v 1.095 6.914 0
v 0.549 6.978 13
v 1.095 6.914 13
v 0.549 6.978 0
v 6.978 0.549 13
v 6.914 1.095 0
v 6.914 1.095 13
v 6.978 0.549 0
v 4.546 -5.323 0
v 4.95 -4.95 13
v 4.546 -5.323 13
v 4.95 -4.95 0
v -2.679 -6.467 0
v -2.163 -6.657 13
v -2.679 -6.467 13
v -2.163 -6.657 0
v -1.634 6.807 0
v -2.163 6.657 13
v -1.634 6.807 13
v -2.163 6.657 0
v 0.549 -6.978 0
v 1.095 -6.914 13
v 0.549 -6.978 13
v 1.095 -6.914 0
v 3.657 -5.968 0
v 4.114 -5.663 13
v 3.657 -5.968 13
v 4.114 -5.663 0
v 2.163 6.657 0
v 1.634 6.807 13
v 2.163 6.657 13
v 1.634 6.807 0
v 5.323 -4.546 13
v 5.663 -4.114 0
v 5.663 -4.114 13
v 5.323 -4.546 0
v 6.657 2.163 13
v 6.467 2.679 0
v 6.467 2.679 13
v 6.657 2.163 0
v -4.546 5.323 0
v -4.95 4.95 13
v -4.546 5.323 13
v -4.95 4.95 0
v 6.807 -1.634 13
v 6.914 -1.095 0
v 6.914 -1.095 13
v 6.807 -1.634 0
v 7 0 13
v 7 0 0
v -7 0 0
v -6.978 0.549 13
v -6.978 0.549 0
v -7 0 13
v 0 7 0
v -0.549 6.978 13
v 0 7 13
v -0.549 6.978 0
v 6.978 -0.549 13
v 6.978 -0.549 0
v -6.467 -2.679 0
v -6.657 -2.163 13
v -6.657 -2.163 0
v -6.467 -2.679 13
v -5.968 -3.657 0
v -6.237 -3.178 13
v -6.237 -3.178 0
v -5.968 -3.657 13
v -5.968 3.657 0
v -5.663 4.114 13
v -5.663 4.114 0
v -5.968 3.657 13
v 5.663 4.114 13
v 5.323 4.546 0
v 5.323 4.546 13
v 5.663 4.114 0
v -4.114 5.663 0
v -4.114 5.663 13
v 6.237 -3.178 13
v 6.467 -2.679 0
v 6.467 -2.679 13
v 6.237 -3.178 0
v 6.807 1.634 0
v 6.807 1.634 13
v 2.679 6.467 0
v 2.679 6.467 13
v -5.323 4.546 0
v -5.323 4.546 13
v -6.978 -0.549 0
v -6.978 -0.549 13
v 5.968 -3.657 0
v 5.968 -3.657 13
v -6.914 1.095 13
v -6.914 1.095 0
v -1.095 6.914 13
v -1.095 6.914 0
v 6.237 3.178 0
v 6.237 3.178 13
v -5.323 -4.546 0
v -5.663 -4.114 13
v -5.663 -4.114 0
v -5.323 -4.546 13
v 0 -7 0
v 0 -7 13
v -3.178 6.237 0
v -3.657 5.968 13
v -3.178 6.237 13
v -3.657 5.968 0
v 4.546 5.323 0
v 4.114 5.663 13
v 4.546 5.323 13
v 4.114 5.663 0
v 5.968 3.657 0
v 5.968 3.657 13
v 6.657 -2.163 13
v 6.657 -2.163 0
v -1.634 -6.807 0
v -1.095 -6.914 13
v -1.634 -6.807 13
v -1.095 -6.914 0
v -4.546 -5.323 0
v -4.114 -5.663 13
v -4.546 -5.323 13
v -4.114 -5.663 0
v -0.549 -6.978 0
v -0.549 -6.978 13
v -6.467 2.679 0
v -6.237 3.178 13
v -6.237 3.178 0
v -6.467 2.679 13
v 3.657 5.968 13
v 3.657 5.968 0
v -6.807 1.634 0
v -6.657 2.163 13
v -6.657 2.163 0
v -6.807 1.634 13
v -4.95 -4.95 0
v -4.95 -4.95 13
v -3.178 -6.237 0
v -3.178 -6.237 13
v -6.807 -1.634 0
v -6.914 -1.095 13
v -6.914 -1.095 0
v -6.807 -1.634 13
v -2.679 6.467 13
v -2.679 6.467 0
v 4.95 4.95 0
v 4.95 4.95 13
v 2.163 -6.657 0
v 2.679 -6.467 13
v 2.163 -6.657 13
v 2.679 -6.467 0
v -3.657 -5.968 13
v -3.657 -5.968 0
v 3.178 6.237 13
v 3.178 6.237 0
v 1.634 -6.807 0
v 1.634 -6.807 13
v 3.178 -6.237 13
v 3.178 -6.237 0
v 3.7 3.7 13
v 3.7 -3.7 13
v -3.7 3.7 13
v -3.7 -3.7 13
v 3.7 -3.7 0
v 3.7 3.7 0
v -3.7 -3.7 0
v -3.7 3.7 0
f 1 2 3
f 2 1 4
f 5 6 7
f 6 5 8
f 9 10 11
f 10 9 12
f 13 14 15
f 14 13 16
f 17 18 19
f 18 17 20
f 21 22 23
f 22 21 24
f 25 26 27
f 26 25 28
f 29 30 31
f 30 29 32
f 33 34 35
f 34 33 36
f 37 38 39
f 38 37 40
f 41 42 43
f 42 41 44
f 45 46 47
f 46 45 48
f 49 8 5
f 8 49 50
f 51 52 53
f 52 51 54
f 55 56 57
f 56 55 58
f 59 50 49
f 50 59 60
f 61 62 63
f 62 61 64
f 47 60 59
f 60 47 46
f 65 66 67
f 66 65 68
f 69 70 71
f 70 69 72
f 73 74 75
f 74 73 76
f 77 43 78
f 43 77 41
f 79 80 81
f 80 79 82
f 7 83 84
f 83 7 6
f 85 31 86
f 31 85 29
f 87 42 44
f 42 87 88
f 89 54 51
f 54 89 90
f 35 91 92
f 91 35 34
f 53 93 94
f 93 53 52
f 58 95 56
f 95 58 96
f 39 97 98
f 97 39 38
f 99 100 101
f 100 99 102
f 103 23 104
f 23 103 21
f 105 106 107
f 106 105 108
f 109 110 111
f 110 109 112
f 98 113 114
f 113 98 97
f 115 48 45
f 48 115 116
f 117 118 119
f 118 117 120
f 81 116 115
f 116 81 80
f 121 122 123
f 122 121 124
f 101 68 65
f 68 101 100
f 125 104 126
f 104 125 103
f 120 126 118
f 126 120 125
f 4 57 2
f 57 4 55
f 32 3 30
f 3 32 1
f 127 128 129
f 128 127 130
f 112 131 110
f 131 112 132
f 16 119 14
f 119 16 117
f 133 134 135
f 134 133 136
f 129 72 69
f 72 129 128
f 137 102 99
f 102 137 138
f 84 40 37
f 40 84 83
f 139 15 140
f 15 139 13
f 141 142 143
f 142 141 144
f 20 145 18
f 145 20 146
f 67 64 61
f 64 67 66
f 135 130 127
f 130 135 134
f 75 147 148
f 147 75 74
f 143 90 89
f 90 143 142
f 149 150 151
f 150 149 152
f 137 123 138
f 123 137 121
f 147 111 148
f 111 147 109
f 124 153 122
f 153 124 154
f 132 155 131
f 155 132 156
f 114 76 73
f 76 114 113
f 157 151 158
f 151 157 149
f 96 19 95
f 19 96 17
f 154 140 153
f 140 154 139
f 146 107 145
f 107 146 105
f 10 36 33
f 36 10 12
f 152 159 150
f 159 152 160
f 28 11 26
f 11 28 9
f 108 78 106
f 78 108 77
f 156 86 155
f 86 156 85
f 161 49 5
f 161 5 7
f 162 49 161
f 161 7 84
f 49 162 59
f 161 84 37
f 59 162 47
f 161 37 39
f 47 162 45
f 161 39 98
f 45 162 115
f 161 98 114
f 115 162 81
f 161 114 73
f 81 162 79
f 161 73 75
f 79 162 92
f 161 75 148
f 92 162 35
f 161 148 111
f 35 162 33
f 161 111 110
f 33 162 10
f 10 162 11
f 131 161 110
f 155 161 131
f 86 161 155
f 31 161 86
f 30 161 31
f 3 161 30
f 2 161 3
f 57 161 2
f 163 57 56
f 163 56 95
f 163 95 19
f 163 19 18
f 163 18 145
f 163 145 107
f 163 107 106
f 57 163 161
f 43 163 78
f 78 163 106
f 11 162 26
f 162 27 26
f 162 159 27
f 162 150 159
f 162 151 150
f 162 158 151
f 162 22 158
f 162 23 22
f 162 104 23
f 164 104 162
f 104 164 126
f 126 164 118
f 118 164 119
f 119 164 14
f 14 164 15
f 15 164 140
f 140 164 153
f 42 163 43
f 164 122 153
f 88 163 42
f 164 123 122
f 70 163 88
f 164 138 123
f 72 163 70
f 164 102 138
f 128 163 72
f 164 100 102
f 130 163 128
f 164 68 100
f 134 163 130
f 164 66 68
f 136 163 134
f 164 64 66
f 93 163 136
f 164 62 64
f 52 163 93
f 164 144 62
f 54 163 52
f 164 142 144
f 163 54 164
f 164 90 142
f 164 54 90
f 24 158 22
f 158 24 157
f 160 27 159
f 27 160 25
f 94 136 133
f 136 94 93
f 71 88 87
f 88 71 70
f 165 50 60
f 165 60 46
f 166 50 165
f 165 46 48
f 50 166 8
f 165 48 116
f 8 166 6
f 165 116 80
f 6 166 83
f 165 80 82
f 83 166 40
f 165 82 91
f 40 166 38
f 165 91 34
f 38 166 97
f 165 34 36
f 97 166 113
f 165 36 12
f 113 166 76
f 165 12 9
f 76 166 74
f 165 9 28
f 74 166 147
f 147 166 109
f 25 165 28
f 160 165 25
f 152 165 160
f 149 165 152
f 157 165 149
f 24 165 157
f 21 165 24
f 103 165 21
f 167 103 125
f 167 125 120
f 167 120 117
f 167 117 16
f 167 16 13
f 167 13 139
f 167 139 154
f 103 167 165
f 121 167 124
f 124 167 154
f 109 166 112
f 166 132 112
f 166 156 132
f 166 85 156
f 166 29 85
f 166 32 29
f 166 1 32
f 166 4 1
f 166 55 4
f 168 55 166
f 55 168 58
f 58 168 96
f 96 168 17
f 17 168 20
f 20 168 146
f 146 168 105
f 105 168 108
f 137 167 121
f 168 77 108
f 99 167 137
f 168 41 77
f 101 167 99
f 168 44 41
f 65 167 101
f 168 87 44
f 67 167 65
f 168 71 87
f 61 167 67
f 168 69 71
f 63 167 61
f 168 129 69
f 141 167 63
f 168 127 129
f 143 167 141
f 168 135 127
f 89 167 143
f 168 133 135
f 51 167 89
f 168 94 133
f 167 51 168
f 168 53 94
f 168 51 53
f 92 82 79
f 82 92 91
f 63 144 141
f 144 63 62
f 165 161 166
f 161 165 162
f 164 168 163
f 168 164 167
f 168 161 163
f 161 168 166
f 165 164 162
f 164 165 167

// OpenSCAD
$fn=80;
th=2;
w = 6.4+1; //more needed??

difference()
{
cylinder(r=7, h=13);
cube([w,w,w*5], center=true);
}
